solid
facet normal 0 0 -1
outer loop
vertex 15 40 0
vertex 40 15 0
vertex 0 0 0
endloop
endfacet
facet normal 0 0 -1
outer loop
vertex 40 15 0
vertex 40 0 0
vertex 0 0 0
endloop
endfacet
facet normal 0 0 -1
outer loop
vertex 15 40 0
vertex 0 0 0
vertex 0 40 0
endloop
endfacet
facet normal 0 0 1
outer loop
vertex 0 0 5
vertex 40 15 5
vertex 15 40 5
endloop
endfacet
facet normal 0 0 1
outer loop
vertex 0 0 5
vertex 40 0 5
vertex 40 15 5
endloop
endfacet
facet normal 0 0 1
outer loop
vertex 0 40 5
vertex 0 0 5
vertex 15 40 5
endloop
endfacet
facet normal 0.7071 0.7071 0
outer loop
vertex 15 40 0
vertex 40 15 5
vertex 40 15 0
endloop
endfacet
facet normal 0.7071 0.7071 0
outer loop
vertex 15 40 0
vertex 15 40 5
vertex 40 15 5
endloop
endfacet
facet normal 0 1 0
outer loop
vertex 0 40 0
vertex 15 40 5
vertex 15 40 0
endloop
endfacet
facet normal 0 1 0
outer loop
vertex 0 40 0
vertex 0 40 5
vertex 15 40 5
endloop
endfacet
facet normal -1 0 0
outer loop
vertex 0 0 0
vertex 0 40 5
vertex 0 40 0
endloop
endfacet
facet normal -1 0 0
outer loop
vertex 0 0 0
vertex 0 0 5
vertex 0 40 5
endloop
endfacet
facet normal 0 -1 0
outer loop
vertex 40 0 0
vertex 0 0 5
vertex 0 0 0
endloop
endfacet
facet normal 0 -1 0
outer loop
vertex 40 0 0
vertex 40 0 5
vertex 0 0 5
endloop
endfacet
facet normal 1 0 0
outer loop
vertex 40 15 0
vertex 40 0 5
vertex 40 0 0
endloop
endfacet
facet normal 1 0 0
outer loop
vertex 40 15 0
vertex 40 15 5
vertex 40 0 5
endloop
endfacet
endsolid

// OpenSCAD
// file: Parameters.scad
/* Frame and Hardware Parameters */
bracketThickness = 5;
extrusionThickness = 15;
narrowScrewHoleSpacing = 15;
wideScrewHoleSpacing = 30;
screwHoleDiam = 4;

/* Design Parameters */
XYSpacing = 15;

/* Gear Parameters */
gearDiam = 50;


/* 608 Bearing Mount Parameters */
bearingHolderWallThickness = 3;
bearingHolderWallHeight = 4;
bearingRadius = 11;

/* top bracket parameters */
gearSpacing = 10; // spacing between gear and extrusion
exteriorSpace = 10; // spacing beyond the bearing mount

/* lower bracket parameters */
footHeight = 10;
footDimension = bracketThickness + extrusionThickness;
bracketInnerDimension = 30;



$fs = .5;
$fa = 3;
// main file
include <Parameters.scad>;
module BracketPentagon(x, y=0, height=bracketThickness, w=extrusionThickness) {
	y = y == 0 ? x : y;
	linear_extrude(height=height) polygon(points=[[0,0],[x,0],[x,w],[w,y],[0,y]]);
}

BracketPentagon(40);
